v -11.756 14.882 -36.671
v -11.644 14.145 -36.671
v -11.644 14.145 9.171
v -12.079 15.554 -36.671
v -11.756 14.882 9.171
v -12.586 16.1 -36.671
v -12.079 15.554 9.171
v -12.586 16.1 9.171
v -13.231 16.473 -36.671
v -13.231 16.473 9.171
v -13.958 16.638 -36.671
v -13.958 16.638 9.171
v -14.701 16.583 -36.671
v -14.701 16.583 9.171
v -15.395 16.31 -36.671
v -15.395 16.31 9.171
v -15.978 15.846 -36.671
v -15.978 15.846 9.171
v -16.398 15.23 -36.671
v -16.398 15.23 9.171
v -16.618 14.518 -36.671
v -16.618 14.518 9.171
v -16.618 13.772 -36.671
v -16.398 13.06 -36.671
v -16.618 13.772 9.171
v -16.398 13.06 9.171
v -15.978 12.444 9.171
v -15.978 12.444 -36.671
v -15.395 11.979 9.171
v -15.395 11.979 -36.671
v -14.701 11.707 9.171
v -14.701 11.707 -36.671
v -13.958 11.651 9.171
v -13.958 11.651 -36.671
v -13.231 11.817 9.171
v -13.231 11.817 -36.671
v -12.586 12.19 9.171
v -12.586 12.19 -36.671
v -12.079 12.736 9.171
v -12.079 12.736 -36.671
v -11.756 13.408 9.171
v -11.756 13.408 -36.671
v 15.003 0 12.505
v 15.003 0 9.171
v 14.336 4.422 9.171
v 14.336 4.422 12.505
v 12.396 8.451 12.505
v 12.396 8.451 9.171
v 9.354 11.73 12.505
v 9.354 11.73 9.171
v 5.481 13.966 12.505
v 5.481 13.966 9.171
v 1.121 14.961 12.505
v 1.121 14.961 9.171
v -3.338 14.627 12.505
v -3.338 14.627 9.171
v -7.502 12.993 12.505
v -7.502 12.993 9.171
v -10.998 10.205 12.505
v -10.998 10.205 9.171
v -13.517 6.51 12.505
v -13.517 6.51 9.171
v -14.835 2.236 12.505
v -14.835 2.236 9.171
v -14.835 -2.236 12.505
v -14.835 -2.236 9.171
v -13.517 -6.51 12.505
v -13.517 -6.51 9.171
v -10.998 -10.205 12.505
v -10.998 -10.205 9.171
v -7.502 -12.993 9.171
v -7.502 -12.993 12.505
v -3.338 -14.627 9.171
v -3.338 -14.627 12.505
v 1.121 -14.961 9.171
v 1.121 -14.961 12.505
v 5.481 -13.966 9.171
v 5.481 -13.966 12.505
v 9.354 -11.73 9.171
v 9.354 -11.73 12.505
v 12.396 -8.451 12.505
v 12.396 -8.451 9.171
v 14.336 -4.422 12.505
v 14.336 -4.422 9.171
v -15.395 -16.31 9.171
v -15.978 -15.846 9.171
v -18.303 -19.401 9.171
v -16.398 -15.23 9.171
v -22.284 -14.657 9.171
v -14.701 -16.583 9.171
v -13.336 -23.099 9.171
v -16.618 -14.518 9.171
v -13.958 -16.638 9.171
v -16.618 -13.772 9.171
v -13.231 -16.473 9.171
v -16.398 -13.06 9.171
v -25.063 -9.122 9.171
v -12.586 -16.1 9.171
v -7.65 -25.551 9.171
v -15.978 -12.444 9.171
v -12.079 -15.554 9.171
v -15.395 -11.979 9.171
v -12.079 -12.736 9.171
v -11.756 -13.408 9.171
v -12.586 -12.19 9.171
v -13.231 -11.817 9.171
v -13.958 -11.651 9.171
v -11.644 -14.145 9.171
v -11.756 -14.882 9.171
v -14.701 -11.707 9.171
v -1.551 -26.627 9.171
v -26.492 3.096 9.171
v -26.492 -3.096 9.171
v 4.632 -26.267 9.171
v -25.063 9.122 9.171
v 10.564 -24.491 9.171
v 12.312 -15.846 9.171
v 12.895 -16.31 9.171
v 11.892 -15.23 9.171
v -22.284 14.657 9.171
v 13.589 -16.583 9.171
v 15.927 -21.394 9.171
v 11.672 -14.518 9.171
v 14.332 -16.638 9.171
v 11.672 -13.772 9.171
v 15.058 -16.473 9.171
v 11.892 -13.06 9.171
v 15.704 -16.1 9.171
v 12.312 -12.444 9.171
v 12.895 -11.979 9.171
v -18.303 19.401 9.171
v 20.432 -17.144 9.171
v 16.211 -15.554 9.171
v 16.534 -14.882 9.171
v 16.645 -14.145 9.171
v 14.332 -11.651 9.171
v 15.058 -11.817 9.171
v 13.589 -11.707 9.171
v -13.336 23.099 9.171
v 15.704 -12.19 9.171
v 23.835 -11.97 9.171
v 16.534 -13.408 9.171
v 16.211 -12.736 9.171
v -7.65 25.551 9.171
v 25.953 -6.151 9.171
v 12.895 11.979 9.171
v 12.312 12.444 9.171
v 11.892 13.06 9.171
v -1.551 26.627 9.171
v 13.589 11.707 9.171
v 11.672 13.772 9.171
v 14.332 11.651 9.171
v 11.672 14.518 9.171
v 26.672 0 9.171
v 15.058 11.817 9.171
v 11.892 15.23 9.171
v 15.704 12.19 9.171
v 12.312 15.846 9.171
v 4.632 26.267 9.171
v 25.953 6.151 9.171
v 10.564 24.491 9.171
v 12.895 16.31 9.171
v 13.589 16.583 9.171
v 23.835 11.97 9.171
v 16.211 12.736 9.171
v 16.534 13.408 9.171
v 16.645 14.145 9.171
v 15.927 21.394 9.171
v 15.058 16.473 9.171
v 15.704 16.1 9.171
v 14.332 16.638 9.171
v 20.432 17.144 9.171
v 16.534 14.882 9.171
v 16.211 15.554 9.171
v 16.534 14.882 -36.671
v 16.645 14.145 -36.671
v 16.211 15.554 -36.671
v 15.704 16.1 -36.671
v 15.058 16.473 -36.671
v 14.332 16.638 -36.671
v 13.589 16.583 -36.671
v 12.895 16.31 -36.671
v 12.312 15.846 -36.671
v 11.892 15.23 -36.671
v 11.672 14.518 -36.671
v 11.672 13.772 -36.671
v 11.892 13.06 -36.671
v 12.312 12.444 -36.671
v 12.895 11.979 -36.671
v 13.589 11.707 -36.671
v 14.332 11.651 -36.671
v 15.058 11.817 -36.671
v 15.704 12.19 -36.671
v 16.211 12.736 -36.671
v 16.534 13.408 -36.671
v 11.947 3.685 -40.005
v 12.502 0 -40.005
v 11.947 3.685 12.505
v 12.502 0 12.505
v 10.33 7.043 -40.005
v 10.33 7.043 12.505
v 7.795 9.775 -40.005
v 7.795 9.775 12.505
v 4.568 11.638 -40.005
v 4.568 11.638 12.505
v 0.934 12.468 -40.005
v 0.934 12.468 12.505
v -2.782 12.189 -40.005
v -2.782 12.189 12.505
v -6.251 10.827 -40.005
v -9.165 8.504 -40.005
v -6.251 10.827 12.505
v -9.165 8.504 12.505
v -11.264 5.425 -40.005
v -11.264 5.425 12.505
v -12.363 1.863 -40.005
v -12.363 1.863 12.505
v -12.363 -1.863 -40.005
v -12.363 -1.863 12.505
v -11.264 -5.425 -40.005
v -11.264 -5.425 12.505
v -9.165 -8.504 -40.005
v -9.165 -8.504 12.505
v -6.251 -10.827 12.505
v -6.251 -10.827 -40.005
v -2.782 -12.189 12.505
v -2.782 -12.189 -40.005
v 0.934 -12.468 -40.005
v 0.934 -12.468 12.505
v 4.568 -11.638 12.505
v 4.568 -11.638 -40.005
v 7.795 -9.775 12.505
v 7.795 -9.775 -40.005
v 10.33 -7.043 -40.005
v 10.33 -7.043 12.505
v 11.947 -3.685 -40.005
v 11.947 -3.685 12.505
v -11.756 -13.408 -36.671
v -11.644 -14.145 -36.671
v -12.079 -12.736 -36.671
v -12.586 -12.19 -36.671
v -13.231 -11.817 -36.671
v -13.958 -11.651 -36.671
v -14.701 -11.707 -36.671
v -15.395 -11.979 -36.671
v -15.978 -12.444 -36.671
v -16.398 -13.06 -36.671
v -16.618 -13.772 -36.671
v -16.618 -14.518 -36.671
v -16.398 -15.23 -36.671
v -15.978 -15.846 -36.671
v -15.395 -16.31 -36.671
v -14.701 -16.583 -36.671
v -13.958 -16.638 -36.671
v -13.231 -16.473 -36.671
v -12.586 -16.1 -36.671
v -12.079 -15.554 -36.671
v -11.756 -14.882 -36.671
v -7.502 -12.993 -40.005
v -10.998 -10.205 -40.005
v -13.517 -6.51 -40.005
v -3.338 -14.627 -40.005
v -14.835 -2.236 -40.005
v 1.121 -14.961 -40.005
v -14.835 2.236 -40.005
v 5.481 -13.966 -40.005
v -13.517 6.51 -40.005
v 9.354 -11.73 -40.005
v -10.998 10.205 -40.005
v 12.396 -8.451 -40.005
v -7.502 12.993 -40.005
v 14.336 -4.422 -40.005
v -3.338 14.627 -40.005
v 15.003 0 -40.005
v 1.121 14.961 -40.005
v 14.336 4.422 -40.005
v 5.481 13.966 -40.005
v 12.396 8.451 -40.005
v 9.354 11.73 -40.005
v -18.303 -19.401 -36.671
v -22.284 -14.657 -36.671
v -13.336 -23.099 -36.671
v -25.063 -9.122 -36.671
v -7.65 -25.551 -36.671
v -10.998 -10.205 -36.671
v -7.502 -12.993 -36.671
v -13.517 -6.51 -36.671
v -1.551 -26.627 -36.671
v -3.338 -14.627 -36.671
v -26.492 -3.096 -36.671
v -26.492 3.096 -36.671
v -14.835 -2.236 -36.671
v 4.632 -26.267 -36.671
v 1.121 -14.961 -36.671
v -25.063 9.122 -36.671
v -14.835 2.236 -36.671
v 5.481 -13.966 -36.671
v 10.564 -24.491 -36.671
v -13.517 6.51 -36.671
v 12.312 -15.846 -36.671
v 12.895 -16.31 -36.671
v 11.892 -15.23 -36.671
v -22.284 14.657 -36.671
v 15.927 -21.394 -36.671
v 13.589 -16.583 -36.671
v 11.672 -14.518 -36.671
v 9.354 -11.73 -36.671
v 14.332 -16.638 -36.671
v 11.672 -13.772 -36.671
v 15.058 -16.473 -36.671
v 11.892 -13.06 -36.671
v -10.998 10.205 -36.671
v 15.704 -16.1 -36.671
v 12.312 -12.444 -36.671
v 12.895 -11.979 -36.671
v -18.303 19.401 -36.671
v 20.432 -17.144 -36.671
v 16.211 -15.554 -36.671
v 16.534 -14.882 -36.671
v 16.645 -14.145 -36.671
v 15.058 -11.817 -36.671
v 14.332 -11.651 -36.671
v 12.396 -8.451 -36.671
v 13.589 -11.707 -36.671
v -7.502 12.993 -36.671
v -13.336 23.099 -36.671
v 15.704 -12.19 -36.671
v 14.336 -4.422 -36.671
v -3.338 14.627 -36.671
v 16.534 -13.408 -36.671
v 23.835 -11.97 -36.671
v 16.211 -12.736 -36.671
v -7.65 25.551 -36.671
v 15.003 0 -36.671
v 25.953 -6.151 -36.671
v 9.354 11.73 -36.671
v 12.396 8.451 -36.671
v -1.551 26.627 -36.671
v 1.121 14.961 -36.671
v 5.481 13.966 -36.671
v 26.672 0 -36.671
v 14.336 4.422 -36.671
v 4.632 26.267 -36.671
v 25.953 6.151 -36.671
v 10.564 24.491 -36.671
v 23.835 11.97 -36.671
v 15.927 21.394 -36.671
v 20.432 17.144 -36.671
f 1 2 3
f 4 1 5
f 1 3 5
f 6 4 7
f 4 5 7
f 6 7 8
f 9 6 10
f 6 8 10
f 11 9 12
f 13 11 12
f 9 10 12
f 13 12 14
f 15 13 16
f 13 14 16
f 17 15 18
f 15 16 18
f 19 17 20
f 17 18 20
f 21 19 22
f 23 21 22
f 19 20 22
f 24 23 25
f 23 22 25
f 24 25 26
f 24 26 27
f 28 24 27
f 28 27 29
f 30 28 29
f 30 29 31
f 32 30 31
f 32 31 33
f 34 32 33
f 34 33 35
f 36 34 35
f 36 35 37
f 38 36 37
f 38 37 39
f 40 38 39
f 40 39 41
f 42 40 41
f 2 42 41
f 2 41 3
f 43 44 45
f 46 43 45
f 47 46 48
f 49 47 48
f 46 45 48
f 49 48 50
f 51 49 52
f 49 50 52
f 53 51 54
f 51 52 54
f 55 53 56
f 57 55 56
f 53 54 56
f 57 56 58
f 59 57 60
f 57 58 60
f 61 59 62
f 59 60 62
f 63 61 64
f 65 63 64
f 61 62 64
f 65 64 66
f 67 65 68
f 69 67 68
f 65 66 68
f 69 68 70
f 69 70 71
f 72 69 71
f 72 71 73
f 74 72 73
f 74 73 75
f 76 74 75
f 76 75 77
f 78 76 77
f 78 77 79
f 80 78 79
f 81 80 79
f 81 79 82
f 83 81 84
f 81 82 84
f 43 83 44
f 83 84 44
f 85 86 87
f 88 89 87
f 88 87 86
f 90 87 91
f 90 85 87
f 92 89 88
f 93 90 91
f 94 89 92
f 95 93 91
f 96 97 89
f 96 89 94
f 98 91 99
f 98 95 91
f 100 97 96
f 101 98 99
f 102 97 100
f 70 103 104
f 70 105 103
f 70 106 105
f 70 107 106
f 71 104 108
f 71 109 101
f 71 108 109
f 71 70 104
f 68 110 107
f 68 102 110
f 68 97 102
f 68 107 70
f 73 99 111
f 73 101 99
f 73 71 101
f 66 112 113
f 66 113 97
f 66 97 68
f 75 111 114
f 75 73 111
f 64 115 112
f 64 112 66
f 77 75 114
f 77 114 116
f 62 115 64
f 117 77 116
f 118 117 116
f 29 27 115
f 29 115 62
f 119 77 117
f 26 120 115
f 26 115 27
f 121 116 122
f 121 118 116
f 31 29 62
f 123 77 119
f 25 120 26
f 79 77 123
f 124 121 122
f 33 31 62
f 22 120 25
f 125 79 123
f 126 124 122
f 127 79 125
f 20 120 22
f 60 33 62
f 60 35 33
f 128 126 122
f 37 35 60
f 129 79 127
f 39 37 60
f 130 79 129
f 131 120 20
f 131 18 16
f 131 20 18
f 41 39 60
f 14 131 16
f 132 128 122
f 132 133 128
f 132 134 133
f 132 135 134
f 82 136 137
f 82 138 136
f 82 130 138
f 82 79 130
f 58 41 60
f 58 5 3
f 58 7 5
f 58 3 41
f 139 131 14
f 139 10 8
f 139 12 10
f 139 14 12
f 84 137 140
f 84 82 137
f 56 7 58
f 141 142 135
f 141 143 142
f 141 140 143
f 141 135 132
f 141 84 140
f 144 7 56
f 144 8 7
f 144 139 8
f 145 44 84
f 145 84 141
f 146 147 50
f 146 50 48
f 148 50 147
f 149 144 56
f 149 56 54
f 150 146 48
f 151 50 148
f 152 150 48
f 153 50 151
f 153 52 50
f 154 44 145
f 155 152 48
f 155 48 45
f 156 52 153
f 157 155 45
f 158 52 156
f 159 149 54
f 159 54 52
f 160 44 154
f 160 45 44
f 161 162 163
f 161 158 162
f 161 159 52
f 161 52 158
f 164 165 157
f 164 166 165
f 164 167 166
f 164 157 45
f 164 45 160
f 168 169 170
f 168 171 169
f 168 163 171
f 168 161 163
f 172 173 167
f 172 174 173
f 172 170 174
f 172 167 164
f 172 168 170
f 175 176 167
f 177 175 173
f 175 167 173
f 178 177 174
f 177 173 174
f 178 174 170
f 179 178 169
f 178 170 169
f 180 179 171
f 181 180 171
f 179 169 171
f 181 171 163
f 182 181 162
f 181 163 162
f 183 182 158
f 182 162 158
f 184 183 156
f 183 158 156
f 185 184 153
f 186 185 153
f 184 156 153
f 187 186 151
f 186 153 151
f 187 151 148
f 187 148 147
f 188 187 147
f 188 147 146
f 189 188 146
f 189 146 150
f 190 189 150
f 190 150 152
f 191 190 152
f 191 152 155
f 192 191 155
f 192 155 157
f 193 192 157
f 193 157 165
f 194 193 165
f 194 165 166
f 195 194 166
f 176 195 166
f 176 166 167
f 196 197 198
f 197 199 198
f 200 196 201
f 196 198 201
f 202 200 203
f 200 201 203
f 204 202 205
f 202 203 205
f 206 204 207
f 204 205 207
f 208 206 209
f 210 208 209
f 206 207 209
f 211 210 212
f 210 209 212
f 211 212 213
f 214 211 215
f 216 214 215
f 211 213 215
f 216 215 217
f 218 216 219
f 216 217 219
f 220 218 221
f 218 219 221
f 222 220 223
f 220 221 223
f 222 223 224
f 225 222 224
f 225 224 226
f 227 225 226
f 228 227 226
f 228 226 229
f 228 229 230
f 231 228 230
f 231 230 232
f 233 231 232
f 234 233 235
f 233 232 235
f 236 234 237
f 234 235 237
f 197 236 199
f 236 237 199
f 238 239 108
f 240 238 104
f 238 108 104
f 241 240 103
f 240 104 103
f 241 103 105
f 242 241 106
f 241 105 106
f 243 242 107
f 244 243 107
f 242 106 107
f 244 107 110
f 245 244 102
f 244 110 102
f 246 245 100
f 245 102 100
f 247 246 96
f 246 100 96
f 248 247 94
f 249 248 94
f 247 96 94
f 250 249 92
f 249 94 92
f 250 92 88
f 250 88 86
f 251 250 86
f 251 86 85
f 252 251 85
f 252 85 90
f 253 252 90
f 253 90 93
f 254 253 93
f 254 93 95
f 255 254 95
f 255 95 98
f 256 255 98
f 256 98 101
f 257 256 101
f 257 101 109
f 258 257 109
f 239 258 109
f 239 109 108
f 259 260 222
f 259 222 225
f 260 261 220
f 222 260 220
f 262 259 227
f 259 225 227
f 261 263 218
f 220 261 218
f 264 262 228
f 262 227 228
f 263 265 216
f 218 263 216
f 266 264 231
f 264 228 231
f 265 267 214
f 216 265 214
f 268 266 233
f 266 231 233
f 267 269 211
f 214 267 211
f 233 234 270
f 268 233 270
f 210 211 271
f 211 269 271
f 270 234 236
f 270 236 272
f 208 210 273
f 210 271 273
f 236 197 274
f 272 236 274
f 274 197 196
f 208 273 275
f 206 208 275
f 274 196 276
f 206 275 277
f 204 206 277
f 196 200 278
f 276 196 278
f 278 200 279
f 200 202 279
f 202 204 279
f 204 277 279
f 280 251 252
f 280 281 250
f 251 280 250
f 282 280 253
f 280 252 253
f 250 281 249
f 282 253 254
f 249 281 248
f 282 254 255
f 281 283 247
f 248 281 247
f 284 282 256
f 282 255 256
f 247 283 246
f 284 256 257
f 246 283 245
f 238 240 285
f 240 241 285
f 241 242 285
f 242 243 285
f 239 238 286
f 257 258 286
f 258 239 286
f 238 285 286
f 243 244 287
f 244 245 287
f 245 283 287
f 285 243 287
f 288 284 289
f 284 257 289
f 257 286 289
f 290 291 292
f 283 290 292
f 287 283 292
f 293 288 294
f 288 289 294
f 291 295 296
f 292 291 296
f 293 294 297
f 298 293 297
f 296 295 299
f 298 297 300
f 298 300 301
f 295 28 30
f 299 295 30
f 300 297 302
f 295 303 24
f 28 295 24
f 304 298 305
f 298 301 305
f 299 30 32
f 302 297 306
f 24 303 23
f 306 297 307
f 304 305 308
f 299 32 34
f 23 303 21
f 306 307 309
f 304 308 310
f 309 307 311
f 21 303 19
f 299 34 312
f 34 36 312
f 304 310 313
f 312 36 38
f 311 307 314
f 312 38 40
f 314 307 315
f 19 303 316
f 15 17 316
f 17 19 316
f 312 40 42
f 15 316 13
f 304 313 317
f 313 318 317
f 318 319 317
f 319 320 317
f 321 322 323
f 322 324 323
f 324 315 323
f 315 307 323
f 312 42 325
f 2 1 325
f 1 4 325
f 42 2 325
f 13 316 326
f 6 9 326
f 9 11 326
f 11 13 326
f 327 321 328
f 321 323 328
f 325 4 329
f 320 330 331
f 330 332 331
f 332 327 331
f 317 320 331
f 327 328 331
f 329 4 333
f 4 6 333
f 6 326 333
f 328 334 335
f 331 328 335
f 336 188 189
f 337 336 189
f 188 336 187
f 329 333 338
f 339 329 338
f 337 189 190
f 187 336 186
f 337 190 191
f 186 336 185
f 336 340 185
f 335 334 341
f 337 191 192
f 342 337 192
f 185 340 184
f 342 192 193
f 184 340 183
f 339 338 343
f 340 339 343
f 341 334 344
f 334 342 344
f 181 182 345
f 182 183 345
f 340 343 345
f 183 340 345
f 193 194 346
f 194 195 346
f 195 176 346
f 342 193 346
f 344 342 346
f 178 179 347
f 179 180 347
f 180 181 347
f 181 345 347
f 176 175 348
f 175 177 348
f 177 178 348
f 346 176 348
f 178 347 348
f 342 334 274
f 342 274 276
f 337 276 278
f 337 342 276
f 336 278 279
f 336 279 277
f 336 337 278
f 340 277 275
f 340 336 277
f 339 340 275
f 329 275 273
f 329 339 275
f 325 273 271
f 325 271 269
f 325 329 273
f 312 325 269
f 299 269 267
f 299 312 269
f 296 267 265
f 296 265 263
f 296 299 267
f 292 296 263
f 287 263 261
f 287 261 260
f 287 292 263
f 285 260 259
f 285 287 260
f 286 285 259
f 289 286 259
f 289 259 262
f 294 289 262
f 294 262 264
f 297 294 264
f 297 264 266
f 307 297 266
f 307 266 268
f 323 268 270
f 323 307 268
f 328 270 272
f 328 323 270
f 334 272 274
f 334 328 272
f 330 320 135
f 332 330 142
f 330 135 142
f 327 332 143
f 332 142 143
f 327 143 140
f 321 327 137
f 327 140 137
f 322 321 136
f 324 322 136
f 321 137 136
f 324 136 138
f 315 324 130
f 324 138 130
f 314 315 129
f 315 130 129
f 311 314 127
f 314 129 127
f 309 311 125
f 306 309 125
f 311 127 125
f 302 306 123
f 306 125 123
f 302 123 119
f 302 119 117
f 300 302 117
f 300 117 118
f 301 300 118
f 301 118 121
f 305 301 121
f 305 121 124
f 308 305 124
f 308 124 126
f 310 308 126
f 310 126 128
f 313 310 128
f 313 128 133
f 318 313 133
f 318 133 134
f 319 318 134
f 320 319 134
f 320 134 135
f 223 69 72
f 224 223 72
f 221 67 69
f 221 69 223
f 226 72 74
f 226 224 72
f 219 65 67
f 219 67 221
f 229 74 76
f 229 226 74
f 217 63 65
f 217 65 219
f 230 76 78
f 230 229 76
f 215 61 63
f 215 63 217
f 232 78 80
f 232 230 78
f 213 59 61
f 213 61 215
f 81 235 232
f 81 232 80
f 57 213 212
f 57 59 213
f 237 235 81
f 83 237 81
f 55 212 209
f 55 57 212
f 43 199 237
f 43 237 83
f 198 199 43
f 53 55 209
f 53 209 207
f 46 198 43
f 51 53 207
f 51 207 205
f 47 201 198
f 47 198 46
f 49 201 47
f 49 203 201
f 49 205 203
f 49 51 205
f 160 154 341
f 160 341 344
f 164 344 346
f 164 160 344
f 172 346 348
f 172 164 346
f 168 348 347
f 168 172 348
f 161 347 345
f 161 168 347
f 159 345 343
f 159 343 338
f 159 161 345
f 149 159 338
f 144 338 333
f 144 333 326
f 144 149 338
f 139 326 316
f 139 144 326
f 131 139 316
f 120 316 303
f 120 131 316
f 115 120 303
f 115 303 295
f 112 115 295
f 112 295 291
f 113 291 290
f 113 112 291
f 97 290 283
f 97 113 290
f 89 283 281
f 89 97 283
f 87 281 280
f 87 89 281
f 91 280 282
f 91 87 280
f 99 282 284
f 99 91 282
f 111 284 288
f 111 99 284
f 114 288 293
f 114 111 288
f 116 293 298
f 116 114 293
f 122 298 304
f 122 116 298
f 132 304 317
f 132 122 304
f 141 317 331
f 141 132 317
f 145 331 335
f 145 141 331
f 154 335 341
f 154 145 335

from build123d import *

# Parameters (mm, degrees)
SKETCH1_R           = 16
SKETCH1_R_2         = 9
SKETCH1_R_3         = 7.5
BOSS_EXTRUDE1_DEPTH = 27.5
SKETCH1_3_R         = 9
SKETCH1_3_R_2       = 7.5
BOSS_EXTRUDE2_DEPTH = 2
SKETCH3_R           = 1.5
CUT_EXTRUDE1_DEPTH  = 47
BOSS_EXTRUDE5_START = -27.5
SKETCH1_5_R         = 9
SKETCH1_5_R_2       = 7.5
BOSS_EXTRUDE5_DEPTH = 2
SCALE1_SCALE        = 1.667


with BuildPart() as part:
    # Sketch1 → Boss-Extrude1 (new body)
    with BuildSketch(Plane.XY):
        Circle(SKETCH1_R)
        Circle(SKETCH1_R_2, mode=Mode.SUBTRACT)
        Circle(SKETCH1_R_2)
        Circle(SKETCH1_R_3, mode=Mode.SUBTRACT)
    extrude(amount=-BOSS_EXTRUDE1_DEPTH)

    # Sketch1<3> → Boss-Extrude2 (add)
    with BuildSketch(Plane.XY):
        Circle(SKETCH1_3_R)
        Circle(SKETCH1_3_R_2, mode=Mode.SUBTRACT)
    extrude(amount=BOSS_EXTRUDE2_DEPTH)

    # Sketch3 → Cut-Extrude1 (cut)
    with BuildSketch(Plane.XY):
        with Locations((-8.485281374, 8.485281374)):
            Circle(SKETCH3_R)
        with Locations((8.485281374, 8.485281374)):
            Circle(SKETCH3_R)
        with Locations((8.485281374, -8.485281374)):
            Circle(SKETCH3_R)
        with Locations((-8.485281374, -8.485281374)):
            Circle(SKETCH3_R)
    extrude(amount=-CUT_EXTRUDE1_DEPTH, mode=Mode.SUBTRACT)

    # Sketch1<5> → Boss-Extrude5 (add)
    with BuildSketch(Plane.XY.offset(BOSS_EXTRUDE5_START)):
        Circle(SKETCH1_5_R)
        Circle(SKETCH1_5_R_2, mode=Mode.SUBTRACT)
    extrude(amount=-BOSS_EXTRUDE5_DEPTH)


with BuildPart() as part_1:
    # Scale1: scaled about (0, 0, -13.75)
    add(part.part.scale(SCALE1_SCALE).moved(Location((0, 0, 9.17125))))


solid = part_1.part
